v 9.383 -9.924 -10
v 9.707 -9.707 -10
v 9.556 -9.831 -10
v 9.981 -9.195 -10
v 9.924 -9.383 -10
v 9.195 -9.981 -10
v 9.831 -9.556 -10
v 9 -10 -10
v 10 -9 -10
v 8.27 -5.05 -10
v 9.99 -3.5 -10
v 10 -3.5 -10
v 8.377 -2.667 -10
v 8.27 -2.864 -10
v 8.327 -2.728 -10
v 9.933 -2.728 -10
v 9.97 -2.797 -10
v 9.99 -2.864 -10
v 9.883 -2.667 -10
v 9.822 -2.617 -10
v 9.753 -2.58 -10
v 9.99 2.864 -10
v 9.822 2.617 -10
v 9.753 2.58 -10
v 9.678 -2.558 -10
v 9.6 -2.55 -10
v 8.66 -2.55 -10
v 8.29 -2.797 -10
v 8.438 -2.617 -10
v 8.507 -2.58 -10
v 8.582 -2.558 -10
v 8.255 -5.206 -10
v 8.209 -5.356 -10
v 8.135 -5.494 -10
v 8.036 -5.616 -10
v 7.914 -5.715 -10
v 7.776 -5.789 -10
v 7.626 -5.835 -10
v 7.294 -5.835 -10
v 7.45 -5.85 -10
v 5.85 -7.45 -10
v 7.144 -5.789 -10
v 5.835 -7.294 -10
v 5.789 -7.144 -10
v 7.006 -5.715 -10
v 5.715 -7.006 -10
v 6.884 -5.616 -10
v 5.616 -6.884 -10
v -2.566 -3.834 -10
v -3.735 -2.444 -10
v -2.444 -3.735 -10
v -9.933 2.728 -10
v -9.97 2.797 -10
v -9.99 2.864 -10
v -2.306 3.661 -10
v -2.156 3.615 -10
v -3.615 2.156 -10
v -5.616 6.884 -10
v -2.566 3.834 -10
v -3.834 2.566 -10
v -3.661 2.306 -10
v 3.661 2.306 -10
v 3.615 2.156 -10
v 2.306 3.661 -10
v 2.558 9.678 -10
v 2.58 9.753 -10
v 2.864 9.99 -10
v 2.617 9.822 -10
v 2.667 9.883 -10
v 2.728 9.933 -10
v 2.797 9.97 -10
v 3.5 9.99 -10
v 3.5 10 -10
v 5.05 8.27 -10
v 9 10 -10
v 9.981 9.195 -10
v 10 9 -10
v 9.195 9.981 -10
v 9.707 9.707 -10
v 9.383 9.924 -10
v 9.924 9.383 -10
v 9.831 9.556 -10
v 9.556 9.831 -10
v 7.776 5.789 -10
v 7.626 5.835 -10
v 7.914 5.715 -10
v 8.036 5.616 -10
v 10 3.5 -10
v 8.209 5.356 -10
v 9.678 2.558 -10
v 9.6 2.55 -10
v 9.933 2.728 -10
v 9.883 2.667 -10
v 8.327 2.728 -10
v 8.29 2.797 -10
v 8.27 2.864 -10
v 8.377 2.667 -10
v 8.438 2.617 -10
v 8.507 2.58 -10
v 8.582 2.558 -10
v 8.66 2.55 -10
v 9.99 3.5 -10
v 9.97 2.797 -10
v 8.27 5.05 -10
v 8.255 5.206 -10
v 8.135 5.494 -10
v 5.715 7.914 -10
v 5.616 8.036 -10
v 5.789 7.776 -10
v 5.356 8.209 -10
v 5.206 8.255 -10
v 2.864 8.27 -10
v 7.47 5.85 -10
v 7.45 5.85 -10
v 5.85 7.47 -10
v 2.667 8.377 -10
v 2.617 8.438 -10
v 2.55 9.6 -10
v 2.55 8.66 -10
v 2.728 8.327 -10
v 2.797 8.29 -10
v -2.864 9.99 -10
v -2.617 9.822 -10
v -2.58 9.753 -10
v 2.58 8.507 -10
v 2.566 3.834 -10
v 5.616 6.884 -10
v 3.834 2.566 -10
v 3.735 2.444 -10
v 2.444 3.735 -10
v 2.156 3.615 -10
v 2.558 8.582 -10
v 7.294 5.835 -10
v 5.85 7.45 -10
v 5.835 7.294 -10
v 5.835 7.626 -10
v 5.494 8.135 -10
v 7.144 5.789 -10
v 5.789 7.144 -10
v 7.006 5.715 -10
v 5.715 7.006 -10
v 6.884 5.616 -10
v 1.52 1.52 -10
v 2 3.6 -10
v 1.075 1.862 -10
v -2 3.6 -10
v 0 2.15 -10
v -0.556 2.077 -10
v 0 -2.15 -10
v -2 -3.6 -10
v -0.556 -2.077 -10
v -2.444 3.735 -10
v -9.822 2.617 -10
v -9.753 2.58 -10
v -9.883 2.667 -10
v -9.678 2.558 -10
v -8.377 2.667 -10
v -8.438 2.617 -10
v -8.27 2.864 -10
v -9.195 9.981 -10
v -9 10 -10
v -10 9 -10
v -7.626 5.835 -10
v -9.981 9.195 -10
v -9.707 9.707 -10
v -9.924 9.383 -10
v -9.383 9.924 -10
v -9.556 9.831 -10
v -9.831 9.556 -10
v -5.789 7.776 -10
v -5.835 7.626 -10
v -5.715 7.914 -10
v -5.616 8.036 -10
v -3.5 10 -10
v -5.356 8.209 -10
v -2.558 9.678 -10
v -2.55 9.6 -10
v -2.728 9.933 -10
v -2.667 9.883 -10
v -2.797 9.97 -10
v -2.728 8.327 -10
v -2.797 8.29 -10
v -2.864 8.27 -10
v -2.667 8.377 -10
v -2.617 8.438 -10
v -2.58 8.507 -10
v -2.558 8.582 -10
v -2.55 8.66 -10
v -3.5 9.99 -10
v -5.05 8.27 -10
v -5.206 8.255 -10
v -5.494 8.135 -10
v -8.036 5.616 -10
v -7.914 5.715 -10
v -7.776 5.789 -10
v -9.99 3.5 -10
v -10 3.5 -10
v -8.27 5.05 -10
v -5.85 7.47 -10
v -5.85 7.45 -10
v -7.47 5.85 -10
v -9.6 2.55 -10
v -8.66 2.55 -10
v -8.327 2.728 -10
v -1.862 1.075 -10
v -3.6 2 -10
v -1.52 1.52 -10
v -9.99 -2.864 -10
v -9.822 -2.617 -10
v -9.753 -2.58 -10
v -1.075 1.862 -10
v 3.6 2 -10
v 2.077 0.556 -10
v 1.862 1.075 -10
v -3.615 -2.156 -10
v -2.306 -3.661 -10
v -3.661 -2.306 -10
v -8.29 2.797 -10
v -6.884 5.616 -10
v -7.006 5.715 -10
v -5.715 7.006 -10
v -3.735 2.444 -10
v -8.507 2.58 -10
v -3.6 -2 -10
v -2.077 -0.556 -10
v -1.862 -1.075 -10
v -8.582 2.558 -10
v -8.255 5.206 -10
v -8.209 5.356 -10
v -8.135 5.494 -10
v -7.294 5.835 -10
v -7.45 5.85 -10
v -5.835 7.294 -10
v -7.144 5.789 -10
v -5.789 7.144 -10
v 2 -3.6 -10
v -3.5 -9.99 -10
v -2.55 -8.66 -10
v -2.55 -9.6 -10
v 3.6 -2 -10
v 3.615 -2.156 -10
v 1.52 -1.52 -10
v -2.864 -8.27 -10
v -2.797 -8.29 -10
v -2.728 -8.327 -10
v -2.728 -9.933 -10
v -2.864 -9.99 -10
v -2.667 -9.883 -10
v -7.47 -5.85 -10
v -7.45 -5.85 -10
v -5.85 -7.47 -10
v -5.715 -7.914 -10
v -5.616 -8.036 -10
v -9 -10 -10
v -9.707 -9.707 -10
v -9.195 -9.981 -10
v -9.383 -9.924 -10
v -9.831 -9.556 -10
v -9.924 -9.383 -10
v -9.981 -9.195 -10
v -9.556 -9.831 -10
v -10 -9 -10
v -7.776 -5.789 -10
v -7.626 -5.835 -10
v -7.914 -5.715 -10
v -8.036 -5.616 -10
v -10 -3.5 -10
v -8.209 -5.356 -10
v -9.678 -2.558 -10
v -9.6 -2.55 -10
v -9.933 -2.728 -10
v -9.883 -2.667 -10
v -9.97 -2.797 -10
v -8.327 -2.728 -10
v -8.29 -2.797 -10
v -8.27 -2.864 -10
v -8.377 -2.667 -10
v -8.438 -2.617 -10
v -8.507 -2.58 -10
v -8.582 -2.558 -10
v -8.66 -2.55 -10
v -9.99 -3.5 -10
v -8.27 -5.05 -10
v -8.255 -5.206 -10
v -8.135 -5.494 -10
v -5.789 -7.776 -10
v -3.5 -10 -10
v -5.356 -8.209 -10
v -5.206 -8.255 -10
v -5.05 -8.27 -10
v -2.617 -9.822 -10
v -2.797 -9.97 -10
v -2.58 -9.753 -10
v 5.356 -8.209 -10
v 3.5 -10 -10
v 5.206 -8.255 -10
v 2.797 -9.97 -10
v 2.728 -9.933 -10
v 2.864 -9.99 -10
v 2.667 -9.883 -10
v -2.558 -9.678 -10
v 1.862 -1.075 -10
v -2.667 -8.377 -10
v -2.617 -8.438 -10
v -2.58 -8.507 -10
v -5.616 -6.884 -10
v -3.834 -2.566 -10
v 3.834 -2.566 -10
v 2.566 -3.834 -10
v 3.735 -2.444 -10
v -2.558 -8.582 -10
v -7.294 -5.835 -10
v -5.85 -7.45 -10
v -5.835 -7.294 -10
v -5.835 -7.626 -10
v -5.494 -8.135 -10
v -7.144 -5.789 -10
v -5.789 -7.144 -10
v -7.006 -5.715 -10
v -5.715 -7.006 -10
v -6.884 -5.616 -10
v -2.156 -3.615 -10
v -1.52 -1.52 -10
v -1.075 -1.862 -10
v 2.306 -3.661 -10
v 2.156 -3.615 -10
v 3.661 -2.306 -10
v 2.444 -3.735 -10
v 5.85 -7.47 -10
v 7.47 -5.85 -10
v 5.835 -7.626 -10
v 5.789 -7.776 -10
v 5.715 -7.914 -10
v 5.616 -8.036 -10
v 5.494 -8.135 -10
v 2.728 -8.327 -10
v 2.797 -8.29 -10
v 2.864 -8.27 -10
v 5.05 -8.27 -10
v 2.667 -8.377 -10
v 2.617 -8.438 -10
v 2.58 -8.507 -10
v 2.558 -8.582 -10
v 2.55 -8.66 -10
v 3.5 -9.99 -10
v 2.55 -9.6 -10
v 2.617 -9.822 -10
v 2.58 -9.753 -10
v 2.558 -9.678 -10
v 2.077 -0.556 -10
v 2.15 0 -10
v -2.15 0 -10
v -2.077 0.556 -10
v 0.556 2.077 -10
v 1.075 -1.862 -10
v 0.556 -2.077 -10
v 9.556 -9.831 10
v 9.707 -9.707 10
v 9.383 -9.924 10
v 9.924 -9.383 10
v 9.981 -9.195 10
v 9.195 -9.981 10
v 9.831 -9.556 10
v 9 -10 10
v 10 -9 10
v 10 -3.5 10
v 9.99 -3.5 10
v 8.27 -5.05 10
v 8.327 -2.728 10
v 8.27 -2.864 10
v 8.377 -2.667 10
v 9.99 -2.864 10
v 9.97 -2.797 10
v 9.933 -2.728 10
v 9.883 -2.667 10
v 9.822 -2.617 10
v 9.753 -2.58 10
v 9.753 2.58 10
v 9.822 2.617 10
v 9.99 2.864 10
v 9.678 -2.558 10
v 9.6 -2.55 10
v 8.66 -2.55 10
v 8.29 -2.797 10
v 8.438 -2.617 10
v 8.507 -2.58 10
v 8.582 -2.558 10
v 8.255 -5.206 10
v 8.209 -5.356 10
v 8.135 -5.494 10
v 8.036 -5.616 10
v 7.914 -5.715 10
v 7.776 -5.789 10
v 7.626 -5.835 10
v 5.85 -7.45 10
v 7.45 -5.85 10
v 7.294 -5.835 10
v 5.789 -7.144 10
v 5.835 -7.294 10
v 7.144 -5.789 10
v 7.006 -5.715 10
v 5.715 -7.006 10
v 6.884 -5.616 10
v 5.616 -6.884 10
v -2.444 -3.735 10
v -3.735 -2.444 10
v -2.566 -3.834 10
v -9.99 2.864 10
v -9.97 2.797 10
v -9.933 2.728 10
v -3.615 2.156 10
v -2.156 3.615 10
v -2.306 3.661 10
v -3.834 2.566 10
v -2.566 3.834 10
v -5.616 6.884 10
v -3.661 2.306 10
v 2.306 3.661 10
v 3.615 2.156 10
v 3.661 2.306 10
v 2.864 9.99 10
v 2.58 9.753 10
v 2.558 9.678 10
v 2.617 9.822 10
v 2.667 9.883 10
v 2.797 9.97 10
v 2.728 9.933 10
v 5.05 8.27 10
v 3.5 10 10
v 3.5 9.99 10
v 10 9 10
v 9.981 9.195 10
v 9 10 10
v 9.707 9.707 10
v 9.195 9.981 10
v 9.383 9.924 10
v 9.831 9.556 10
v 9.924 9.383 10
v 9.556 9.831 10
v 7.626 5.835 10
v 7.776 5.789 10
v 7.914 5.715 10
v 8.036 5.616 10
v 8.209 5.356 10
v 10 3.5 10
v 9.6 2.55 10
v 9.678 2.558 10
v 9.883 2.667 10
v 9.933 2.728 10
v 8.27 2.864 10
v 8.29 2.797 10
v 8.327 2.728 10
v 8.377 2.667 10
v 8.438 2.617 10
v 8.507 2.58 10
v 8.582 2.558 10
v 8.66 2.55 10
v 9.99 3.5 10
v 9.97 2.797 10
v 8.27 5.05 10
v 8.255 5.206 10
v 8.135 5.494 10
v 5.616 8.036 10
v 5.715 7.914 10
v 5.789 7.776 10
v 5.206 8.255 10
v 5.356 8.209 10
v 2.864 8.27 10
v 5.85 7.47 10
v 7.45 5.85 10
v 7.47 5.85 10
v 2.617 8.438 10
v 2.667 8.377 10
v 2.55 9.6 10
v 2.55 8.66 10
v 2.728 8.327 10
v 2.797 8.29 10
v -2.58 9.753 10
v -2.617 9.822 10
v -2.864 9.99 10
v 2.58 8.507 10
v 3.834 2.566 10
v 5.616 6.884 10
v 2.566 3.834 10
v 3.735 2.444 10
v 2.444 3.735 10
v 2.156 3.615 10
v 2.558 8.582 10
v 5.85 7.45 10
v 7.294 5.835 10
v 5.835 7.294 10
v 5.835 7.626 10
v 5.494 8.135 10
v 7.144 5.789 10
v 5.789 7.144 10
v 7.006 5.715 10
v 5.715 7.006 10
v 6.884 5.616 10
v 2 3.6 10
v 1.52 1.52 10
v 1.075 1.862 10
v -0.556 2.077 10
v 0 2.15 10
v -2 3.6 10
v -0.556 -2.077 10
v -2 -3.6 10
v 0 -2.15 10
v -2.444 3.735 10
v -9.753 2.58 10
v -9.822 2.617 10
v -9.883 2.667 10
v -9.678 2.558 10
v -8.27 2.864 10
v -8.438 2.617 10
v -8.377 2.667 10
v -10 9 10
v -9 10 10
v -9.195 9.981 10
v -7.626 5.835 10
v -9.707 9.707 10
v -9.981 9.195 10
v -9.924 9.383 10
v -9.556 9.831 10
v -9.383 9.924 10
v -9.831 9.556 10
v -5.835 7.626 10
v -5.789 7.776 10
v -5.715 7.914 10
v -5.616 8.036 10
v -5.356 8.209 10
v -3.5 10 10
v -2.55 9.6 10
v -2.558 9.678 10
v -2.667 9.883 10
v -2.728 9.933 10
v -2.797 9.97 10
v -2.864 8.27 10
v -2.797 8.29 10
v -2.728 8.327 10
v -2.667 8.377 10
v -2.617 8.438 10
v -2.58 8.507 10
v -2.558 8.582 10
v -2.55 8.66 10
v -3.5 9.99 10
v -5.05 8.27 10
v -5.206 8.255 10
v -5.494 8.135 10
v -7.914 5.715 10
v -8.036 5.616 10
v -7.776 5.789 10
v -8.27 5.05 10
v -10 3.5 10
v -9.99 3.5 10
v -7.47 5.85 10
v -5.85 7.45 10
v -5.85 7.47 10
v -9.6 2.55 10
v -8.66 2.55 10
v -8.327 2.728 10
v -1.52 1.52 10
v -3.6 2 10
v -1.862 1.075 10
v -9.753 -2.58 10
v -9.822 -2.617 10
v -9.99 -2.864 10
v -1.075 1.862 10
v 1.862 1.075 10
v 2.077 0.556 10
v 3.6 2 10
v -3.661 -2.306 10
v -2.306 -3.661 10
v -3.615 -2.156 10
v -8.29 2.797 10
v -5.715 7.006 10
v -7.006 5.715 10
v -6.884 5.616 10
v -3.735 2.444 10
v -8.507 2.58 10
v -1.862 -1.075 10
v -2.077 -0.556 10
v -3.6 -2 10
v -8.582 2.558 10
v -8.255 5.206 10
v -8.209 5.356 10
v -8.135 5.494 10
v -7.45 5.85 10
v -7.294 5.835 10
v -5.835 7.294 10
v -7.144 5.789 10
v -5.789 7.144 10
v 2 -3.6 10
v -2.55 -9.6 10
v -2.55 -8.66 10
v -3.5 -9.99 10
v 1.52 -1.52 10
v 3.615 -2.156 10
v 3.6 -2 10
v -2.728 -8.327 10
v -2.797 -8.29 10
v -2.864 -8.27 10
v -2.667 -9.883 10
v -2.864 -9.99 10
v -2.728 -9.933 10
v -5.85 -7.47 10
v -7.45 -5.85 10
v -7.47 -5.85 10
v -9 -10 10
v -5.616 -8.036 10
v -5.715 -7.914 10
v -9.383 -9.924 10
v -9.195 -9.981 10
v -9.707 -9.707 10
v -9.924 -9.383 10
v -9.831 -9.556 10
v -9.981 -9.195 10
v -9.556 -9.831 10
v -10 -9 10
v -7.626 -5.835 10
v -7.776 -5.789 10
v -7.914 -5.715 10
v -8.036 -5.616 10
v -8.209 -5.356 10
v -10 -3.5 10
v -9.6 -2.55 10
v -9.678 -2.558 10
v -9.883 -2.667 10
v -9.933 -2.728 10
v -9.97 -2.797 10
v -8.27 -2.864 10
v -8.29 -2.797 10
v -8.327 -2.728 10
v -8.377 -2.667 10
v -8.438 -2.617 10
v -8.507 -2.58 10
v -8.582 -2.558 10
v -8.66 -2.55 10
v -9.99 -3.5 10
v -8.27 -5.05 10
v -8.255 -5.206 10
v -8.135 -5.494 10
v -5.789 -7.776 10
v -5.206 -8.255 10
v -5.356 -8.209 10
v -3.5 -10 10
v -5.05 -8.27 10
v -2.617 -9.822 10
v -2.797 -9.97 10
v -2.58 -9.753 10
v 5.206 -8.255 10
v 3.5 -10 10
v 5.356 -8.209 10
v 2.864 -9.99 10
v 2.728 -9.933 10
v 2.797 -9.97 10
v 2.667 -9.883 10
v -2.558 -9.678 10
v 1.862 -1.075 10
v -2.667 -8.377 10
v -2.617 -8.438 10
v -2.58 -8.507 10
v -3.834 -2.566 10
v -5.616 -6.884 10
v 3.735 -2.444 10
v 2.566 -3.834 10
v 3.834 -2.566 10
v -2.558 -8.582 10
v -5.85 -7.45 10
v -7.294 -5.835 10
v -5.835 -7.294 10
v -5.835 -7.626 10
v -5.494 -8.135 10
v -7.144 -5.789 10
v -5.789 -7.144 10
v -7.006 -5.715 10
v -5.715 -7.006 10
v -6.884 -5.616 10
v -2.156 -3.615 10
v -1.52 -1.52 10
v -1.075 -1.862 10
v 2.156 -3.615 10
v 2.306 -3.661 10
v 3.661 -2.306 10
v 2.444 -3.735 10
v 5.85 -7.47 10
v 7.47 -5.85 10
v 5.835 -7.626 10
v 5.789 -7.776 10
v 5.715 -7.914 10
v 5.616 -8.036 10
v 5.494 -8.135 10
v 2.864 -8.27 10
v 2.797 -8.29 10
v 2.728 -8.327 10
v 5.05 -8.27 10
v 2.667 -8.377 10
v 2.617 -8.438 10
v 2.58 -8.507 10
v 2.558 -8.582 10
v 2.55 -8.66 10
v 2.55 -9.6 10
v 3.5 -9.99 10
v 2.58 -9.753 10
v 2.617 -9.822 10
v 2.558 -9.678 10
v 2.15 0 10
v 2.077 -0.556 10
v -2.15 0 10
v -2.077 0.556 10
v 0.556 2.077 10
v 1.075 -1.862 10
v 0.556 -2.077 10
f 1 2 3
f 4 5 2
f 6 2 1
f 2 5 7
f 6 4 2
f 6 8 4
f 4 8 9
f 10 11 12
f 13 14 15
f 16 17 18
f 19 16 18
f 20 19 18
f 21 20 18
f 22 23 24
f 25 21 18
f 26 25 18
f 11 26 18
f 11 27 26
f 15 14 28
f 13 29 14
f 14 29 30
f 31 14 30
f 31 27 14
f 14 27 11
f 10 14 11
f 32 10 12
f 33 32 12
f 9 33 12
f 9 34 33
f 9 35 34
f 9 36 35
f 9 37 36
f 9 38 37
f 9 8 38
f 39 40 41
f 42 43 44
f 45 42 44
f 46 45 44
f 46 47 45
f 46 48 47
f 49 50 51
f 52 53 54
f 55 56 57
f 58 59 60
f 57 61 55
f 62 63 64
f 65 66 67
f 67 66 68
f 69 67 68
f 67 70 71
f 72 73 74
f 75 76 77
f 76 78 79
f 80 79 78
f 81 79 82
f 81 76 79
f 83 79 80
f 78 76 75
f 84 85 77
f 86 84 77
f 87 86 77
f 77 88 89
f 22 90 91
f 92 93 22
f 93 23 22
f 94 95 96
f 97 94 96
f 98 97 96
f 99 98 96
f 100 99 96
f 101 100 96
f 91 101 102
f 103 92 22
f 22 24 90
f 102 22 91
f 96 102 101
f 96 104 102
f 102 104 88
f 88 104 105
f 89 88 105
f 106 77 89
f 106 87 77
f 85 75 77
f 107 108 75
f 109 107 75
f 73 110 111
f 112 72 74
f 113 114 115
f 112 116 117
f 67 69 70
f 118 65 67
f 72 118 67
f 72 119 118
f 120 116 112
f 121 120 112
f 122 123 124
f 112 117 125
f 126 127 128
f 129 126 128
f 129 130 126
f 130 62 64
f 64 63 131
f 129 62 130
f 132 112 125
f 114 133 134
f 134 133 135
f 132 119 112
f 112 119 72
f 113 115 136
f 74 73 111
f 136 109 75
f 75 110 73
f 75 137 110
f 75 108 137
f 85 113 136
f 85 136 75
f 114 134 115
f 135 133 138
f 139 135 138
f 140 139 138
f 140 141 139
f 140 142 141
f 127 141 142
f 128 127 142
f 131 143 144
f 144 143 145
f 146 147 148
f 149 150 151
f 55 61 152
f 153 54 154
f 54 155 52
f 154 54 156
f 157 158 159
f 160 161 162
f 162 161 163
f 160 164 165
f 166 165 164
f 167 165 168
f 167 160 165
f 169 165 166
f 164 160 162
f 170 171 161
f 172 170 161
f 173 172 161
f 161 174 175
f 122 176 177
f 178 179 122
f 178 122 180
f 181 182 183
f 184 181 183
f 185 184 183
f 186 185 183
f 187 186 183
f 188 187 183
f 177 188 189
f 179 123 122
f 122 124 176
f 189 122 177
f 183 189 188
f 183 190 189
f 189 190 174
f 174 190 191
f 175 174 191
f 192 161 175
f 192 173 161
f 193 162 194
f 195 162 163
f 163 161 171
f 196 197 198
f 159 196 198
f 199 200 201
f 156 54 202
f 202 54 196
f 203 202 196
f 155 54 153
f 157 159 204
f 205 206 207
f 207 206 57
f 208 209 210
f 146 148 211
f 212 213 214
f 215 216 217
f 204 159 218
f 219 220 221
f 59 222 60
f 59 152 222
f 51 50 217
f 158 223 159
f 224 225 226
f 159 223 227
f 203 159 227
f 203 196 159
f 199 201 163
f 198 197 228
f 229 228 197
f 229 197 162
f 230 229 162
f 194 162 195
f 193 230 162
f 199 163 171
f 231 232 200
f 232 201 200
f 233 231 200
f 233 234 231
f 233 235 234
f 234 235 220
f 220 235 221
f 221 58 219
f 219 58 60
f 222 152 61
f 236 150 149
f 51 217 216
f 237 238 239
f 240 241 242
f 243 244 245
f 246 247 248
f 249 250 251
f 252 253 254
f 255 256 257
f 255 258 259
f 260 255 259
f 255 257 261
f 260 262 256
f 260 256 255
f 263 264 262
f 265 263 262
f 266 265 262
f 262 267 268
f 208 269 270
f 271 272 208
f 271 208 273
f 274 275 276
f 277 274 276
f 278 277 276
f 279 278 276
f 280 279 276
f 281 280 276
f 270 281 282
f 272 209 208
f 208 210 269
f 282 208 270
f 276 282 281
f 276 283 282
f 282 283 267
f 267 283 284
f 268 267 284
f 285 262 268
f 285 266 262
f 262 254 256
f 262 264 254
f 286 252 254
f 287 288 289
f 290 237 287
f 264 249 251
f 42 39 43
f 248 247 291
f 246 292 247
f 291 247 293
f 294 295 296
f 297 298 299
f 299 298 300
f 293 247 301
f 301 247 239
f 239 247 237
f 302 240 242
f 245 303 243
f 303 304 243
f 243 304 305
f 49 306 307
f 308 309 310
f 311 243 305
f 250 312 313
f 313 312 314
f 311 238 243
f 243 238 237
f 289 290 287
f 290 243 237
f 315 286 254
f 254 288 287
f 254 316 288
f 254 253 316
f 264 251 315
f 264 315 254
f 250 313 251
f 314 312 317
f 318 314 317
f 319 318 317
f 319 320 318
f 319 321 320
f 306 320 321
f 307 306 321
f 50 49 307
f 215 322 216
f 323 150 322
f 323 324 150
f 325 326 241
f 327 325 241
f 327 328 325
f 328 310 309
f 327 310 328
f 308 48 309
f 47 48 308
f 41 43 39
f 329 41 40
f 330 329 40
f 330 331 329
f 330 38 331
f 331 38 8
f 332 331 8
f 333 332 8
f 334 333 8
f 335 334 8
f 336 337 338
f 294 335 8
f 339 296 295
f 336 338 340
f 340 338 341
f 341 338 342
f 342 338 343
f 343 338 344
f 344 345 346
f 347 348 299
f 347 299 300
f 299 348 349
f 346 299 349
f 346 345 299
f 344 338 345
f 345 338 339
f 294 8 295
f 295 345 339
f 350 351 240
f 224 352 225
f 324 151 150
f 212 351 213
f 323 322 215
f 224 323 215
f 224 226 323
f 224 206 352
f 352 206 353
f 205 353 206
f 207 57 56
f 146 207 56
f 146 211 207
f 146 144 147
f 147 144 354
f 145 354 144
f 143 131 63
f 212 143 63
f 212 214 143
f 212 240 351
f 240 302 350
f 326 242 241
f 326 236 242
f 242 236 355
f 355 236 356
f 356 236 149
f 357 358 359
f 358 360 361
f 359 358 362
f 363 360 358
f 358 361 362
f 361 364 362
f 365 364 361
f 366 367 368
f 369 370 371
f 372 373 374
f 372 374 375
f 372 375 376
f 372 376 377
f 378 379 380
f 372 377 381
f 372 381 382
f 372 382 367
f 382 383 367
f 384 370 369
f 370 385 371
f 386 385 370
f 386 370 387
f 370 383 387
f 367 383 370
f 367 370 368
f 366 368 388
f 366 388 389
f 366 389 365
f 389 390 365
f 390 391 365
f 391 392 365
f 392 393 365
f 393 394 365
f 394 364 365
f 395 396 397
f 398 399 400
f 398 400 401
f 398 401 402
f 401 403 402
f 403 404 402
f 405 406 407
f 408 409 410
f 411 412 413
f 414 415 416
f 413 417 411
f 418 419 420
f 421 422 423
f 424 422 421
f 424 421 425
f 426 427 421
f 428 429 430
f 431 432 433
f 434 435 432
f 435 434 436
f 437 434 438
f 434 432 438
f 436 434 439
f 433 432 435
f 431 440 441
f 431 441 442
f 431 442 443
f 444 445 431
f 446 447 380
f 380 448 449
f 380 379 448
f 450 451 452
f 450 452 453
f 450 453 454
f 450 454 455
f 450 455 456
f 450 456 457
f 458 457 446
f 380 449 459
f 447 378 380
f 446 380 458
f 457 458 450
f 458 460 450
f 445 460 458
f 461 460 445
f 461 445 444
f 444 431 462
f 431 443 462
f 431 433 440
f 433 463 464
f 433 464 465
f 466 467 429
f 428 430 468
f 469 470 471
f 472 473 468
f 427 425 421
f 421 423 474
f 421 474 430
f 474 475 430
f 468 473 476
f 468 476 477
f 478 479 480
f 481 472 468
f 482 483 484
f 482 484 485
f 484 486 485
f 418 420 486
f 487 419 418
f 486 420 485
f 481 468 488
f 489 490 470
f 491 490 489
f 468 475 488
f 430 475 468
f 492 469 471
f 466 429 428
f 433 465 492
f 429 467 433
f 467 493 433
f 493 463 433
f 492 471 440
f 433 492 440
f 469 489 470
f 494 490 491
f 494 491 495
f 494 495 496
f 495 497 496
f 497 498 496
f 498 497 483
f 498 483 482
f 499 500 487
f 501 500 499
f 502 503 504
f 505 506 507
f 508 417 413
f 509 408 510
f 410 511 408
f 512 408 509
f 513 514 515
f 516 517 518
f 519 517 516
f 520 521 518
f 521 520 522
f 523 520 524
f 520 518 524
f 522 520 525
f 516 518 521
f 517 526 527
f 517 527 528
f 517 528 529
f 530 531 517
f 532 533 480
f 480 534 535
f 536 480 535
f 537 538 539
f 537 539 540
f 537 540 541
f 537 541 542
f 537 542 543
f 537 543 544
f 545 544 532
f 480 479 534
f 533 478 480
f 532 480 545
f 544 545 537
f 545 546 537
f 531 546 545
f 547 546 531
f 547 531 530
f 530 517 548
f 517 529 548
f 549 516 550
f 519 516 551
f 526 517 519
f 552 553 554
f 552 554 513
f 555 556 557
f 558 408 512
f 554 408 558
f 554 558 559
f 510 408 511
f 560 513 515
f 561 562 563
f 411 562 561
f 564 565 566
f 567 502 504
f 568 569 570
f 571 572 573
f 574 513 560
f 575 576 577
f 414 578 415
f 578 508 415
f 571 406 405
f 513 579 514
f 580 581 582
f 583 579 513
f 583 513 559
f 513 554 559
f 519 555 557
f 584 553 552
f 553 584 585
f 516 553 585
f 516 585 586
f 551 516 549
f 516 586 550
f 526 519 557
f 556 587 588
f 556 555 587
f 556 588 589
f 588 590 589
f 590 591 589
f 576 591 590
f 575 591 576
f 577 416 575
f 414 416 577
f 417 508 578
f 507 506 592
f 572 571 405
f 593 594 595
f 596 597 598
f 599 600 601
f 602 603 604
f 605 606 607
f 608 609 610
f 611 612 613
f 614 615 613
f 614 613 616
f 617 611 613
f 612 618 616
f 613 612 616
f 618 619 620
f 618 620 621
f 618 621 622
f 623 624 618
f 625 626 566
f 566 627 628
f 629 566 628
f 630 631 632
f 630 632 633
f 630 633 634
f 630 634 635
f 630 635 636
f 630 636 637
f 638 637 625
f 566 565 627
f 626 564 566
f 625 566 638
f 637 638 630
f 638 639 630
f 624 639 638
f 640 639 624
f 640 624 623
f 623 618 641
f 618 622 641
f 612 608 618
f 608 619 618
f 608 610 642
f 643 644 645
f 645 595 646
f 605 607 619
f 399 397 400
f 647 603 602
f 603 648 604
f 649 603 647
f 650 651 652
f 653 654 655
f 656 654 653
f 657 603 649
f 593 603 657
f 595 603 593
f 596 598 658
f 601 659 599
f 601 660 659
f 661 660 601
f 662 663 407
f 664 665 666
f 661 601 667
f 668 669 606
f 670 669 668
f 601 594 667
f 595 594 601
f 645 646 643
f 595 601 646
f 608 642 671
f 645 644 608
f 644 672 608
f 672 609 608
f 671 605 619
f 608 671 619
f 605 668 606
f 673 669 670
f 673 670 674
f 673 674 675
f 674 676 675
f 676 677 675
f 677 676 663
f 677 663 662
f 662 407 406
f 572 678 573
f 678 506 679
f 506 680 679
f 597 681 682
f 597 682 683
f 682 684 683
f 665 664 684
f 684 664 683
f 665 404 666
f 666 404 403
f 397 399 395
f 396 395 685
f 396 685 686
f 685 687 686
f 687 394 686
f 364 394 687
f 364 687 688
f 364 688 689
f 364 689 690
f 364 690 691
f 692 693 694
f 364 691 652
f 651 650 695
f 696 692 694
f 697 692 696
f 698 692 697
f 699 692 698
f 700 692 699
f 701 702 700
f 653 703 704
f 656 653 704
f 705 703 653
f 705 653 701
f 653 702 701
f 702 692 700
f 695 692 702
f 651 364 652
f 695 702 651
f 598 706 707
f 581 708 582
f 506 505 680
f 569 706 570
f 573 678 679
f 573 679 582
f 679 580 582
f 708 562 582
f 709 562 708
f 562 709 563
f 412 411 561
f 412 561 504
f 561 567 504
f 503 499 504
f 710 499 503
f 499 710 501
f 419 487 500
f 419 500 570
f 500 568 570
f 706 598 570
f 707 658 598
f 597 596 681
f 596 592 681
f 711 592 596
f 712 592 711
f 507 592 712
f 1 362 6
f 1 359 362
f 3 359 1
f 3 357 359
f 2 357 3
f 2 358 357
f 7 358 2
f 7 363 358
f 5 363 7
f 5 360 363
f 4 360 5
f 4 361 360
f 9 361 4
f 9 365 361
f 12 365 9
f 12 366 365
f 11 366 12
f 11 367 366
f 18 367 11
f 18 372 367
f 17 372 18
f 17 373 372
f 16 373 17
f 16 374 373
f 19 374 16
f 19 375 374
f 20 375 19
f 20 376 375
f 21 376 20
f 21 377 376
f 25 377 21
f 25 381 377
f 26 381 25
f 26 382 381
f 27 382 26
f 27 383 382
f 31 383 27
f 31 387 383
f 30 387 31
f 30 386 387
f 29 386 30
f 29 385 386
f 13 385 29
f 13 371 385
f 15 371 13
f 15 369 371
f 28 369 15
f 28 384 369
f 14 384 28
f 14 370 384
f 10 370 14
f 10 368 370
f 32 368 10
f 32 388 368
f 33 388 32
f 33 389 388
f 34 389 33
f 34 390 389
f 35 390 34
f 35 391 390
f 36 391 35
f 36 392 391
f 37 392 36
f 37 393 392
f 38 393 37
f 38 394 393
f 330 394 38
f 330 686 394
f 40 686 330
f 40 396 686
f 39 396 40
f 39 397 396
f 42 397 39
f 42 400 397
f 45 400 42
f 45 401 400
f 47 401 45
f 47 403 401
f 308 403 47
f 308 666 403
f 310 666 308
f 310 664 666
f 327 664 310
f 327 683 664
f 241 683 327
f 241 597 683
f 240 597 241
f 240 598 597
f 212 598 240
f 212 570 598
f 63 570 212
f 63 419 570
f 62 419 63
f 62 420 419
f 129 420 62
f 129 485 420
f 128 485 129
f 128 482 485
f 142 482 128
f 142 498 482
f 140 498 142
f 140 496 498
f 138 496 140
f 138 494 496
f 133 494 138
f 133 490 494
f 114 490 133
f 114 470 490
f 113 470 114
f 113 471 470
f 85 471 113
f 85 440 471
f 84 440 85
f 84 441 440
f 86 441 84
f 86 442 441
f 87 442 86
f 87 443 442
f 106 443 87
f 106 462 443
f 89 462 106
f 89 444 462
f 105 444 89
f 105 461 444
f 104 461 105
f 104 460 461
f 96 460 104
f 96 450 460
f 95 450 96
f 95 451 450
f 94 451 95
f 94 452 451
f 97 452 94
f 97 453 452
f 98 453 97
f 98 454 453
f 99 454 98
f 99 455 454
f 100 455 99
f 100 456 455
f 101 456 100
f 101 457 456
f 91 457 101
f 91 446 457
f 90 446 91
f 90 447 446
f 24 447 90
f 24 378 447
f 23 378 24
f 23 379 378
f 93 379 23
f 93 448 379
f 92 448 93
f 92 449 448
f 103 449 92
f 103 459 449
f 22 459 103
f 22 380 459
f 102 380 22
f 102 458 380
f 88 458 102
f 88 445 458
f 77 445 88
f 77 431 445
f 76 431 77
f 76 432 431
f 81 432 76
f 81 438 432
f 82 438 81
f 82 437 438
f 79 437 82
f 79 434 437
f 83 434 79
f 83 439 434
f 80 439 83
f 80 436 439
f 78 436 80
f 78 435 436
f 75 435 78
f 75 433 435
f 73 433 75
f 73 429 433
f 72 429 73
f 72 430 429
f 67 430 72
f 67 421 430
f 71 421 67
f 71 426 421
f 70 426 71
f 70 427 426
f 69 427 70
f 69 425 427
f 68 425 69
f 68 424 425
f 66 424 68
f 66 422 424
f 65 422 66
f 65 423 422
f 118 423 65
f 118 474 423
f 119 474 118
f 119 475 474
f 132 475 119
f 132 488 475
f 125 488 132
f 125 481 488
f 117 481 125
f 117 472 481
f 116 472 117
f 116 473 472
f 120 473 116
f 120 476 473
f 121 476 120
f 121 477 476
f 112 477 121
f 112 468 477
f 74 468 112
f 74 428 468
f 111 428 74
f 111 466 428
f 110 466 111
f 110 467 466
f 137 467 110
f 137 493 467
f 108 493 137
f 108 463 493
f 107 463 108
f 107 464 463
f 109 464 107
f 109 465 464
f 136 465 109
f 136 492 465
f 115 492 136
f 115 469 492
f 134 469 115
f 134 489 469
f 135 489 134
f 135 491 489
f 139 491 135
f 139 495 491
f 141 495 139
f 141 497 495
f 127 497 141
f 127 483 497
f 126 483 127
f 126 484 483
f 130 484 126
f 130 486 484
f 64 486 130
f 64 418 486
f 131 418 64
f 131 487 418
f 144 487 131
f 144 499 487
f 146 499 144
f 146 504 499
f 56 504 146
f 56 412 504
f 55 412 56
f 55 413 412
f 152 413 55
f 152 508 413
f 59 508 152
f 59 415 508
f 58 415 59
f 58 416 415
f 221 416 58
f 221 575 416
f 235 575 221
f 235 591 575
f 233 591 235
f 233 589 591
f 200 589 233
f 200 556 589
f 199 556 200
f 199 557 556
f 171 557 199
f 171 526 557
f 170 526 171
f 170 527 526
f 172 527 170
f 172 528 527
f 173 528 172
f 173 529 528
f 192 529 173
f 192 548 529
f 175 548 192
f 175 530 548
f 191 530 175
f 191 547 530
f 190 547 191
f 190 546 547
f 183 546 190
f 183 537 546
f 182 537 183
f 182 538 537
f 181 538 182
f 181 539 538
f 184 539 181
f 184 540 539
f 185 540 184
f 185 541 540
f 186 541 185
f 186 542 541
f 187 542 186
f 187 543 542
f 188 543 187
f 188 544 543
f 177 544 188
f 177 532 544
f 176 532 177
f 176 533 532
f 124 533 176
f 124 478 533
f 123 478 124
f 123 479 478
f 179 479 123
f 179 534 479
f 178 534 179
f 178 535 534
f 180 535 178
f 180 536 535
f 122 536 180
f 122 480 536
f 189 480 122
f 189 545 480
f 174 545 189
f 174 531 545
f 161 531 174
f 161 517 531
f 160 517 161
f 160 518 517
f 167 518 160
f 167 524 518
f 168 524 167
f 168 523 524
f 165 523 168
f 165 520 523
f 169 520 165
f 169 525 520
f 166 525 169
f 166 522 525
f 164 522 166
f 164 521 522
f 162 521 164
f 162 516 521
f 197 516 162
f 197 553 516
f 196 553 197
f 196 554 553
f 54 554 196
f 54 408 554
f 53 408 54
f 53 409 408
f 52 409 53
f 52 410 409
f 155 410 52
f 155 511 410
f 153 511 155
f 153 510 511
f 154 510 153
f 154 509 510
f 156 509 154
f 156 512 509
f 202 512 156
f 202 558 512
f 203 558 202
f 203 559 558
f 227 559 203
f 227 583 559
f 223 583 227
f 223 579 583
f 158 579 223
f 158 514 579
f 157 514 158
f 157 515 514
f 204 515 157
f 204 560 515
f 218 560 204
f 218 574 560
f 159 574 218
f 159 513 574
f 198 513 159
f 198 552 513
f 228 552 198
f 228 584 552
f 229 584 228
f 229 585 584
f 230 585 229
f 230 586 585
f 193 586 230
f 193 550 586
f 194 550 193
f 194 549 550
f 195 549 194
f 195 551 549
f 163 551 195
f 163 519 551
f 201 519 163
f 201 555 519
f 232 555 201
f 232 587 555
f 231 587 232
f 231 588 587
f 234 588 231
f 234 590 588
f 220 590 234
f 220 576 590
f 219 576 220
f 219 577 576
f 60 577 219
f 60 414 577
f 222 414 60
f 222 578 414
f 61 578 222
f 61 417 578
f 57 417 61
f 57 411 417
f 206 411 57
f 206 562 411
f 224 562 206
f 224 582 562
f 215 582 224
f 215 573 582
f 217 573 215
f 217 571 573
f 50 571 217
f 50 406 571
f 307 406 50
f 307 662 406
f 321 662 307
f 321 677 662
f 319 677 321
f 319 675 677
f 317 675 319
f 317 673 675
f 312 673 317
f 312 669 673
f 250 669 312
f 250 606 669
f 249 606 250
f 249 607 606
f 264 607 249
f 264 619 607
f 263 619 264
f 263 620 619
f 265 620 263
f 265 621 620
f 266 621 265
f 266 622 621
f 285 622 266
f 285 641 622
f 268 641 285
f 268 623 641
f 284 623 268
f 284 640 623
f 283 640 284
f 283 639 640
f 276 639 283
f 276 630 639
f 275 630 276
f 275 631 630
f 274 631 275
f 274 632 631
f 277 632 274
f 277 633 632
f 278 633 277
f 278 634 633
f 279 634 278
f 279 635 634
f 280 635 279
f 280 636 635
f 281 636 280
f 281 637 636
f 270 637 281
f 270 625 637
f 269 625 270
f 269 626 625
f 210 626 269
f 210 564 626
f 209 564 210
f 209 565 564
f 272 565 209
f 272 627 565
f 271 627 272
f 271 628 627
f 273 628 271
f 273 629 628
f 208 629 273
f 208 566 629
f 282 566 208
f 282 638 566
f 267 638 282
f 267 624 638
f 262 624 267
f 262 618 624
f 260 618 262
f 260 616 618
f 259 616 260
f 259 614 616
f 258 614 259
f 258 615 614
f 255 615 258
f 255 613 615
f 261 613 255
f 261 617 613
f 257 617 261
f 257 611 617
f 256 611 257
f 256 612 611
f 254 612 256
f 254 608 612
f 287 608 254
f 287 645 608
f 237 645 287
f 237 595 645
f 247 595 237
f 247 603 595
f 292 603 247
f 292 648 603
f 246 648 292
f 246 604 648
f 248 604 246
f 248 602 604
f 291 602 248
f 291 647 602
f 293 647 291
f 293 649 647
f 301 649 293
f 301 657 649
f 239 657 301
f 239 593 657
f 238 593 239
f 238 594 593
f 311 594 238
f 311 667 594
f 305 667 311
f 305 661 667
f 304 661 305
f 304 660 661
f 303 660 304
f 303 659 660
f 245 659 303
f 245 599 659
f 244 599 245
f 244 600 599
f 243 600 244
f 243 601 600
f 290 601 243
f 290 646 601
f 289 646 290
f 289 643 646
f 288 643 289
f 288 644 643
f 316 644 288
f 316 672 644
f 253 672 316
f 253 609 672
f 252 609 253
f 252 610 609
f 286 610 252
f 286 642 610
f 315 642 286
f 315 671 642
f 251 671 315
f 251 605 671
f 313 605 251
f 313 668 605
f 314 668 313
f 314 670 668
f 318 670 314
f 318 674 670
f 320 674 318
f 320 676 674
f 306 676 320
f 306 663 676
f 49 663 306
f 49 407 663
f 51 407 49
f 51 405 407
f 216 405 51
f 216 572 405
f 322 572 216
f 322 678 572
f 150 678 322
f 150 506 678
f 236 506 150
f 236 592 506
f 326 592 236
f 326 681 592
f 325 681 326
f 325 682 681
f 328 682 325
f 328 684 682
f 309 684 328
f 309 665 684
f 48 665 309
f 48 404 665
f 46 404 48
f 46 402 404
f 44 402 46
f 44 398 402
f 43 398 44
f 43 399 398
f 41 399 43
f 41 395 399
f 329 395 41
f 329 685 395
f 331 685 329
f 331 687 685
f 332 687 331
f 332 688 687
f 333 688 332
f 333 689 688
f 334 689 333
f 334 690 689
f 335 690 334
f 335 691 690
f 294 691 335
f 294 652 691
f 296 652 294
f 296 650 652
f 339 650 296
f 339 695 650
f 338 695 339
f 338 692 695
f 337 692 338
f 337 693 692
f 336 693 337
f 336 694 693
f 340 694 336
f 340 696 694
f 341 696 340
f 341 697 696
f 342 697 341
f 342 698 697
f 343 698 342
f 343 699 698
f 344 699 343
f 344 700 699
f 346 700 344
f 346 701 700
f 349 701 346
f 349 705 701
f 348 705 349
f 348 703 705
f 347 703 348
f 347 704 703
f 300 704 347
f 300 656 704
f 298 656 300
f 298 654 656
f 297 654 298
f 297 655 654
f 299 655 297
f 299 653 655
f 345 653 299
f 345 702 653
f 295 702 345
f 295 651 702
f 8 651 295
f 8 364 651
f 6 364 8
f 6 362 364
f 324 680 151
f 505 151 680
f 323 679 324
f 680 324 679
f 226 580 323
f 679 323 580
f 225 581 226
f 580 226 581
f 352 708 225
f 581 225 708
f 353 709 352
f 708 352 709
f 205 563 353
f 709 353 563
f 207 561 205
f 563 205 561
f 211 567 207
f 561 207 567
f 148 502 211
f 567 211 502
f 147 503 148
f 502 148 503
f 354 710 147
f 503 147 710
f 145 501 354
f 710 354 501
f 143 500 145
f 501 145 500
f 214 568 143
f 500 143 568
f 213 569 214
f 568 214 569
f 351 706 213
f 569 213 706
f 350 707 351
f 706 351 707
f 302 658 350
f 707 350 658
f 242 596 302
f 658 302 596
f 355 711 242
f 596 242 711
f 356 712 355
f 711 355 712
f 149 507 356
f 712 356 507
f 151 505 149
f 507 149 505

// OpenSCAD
/** 
 * @file
 * Generic library for fractional T-Slot extrusions.
 *
 * Creative Commons Share Alike 3.0
 * Copyright (c) 2014 Manuel García
 *
 * Original library (David Lee Miller)
 * https://www.thingiverse.com/thing:136430
 * 
 * Modified to be used in customizer
 */ 

//CUSTOMIZER VARIABLES

ProfileCore = 4.3 * 1;     // Profile core Ø (Default M5).
minkR_TS = 0.04 * 20;  // Minkowski radius for the T-Slot.
minkR_IC = 0.075 * 20; // Minkowski radius for the inner cutout.
minkR_PF = 0.05 * 20;  // Minkowski radius for the profile corners.


height_in_mm = 20;

2020Profile(height_in_mm);

//CUSTOMIZER VARIABLES END

module 2020Profile(height, core = ProfileCore) {
  linear_extrude(height = height, center = true)
  union() {
    difference() {
      minkowski() {
        translate([0, 0, 0]) circle(r = minkR_PF, center = true, $fn = 32);
        square([1 * 20 - 2 * minkR_PF, 1 * 20 - 2 * minkR_PF], center = true);
      }
      translate([0, 0, 0]) circle(r = core / 2, $fn = 24);
      translate([-0.5 * 20 + 0.087 * 20, 0, 0]) tSlot();
      rotate([0, 0, 180]) translate([-0.5 * 20 + 0.087 * 20, 0, 0]) tSlot();
      translate([0, -0.5 * 20 + 0.087 * 20, 0]) rotate([0, 0, 90]) tSlot();
      translate([0, 0.5 * 20 - 0.087 * 20, 0]) rotate([0, 0, -90]) tSlot();
    }
  }
}

module fillet(rad) {
  translate([-rad, -rad, 0])
  difference() {
    translate([0, 0, 0]) square([rad + 0.01, rad + 0.01]);
    circle(r = rad, center = true, $fn = 32);
  }
}

module insideCutout() {
  minkowski() {
    translate([0, 0, 0]) circle(r = minkR_IC, center = true, $fn = 32);
    hull() {
      square([0.2 * 20 - minkR_IC, 0.645 * 20 - 2 * minkR_IC], center = true);
      square([0.8 * 20 - 2 * minkR_IC, 0.001 * 20], center = true);
    }
  }
}

module doubleCutout() {
  union() {
    minkowski() {
      translate([0, 0, 0]) circle(r = minkR_IC, center = true, $fn = 32);
      union() {
        rotate([0, 0, 0]) hull() {
          translate([-0.5 * 20, 0, 0]) hull() {
            square([0.2 * 20 - minkR_IC, 0.645 * 20 - 2 * minkR_IC], center = true);
            square([0.8 * 20 - 2 * minkR_IC, 0.001 * 20], center = true);
          }
          translate([0.5 * 20, 0, 0]) hull() {
            square([0.2 * 20 - minkR_IC, 0.645 * 20 - 2 * minkR_IC], center = true);
            square([0.8 * 20 - 2 * minkR_IC, 0.001 * 20], center = true);
          }
        }
        rotate([0, 0, 90]) hull() {
          translate([-0.5 * 20, 0, 0]) hull() {
            square([0.2 * 20 - minkR_IC, 0.645 * 20 - 2 * minkR_IC], center = true);
            square([0.8 * 20 - 2 * minkR_IC, 0.001 * 20], center = true);
          }
          translate([0.5 * 20, 0, 0]) hull() {
            square([0.2 * 20 - minkR_IC, 0.645 * 20 - 2 * minkR_IC], center = true);
            square([0.8 * 20 - 2 * minkR_IC, 0.001 * 20], center = true);
          }
        }
      }
    }
    rotate([0, 0, 0]) translate([-0.645 * 20 / 2, -0.645 * 20 / 2, 0]) fillet(minkR_IC);
    rotate([0, 0, 180]) translate([-0.645 * 20 / 2, -0.645 * 20 / 2, 0]) fillet(minkR_IC);
    rotate([0, 0, 90]) translate([-0.645 * 20 / 2, -0.645 * 20 / 2, 0]) fillet(minkR_IC);
    rotate([0, 0, -90]) translate([-0.645 * 20 / 2, -0.645 * 20 / 2, 0]) fillet(minkR_IC);
  }
}

module tSlot() {
  union() {
    translate([minkR_TS, 0, 0])
    minkowski() {
      translate([0, 0, 0]) circle(r = minkR_TS, center = true, $fn = 32);
      hull() {
        square([0.001 * 20, 0.585 * 20 - 2 * minkR_TS], center = true);
        translate([(0.233 * 20 - 2 * minkR_TS) / 2, 0, 0]) square([0.233 * 20 - 2 * minkR_TS, 0.2 * 20], center = true);
      }
    }
    translate([-0.255 * 20 / 2 + 0.01, 0, 0]) square(0.255 * 20, center = true);
    translate([-0.35 * 20 / 2 - 0.087 * 20 + 0.01, 0, 0]) square(0.35 * 20, center = true);
    translate([0, -0.255 * 20 / 2, 0]) fillet(minkR_TS / 2);
    translate([-0.087 * 20, -0.255 * 20 / 2, 0]) rotate([0, 0, 90]) fillet(minkR_TS / 2);
    scale([1, -1, 1]) translate([0, -0.255 * 20 / 2, 0]) fillet(minkR_TS / 2);
    scale([1, -1, 1]) translate([-0.087 * 20, -0.255 * 20 / 2, 0]) rotate([0, 0, 90]) fillet(minkR_TS / 2);
  }
}
